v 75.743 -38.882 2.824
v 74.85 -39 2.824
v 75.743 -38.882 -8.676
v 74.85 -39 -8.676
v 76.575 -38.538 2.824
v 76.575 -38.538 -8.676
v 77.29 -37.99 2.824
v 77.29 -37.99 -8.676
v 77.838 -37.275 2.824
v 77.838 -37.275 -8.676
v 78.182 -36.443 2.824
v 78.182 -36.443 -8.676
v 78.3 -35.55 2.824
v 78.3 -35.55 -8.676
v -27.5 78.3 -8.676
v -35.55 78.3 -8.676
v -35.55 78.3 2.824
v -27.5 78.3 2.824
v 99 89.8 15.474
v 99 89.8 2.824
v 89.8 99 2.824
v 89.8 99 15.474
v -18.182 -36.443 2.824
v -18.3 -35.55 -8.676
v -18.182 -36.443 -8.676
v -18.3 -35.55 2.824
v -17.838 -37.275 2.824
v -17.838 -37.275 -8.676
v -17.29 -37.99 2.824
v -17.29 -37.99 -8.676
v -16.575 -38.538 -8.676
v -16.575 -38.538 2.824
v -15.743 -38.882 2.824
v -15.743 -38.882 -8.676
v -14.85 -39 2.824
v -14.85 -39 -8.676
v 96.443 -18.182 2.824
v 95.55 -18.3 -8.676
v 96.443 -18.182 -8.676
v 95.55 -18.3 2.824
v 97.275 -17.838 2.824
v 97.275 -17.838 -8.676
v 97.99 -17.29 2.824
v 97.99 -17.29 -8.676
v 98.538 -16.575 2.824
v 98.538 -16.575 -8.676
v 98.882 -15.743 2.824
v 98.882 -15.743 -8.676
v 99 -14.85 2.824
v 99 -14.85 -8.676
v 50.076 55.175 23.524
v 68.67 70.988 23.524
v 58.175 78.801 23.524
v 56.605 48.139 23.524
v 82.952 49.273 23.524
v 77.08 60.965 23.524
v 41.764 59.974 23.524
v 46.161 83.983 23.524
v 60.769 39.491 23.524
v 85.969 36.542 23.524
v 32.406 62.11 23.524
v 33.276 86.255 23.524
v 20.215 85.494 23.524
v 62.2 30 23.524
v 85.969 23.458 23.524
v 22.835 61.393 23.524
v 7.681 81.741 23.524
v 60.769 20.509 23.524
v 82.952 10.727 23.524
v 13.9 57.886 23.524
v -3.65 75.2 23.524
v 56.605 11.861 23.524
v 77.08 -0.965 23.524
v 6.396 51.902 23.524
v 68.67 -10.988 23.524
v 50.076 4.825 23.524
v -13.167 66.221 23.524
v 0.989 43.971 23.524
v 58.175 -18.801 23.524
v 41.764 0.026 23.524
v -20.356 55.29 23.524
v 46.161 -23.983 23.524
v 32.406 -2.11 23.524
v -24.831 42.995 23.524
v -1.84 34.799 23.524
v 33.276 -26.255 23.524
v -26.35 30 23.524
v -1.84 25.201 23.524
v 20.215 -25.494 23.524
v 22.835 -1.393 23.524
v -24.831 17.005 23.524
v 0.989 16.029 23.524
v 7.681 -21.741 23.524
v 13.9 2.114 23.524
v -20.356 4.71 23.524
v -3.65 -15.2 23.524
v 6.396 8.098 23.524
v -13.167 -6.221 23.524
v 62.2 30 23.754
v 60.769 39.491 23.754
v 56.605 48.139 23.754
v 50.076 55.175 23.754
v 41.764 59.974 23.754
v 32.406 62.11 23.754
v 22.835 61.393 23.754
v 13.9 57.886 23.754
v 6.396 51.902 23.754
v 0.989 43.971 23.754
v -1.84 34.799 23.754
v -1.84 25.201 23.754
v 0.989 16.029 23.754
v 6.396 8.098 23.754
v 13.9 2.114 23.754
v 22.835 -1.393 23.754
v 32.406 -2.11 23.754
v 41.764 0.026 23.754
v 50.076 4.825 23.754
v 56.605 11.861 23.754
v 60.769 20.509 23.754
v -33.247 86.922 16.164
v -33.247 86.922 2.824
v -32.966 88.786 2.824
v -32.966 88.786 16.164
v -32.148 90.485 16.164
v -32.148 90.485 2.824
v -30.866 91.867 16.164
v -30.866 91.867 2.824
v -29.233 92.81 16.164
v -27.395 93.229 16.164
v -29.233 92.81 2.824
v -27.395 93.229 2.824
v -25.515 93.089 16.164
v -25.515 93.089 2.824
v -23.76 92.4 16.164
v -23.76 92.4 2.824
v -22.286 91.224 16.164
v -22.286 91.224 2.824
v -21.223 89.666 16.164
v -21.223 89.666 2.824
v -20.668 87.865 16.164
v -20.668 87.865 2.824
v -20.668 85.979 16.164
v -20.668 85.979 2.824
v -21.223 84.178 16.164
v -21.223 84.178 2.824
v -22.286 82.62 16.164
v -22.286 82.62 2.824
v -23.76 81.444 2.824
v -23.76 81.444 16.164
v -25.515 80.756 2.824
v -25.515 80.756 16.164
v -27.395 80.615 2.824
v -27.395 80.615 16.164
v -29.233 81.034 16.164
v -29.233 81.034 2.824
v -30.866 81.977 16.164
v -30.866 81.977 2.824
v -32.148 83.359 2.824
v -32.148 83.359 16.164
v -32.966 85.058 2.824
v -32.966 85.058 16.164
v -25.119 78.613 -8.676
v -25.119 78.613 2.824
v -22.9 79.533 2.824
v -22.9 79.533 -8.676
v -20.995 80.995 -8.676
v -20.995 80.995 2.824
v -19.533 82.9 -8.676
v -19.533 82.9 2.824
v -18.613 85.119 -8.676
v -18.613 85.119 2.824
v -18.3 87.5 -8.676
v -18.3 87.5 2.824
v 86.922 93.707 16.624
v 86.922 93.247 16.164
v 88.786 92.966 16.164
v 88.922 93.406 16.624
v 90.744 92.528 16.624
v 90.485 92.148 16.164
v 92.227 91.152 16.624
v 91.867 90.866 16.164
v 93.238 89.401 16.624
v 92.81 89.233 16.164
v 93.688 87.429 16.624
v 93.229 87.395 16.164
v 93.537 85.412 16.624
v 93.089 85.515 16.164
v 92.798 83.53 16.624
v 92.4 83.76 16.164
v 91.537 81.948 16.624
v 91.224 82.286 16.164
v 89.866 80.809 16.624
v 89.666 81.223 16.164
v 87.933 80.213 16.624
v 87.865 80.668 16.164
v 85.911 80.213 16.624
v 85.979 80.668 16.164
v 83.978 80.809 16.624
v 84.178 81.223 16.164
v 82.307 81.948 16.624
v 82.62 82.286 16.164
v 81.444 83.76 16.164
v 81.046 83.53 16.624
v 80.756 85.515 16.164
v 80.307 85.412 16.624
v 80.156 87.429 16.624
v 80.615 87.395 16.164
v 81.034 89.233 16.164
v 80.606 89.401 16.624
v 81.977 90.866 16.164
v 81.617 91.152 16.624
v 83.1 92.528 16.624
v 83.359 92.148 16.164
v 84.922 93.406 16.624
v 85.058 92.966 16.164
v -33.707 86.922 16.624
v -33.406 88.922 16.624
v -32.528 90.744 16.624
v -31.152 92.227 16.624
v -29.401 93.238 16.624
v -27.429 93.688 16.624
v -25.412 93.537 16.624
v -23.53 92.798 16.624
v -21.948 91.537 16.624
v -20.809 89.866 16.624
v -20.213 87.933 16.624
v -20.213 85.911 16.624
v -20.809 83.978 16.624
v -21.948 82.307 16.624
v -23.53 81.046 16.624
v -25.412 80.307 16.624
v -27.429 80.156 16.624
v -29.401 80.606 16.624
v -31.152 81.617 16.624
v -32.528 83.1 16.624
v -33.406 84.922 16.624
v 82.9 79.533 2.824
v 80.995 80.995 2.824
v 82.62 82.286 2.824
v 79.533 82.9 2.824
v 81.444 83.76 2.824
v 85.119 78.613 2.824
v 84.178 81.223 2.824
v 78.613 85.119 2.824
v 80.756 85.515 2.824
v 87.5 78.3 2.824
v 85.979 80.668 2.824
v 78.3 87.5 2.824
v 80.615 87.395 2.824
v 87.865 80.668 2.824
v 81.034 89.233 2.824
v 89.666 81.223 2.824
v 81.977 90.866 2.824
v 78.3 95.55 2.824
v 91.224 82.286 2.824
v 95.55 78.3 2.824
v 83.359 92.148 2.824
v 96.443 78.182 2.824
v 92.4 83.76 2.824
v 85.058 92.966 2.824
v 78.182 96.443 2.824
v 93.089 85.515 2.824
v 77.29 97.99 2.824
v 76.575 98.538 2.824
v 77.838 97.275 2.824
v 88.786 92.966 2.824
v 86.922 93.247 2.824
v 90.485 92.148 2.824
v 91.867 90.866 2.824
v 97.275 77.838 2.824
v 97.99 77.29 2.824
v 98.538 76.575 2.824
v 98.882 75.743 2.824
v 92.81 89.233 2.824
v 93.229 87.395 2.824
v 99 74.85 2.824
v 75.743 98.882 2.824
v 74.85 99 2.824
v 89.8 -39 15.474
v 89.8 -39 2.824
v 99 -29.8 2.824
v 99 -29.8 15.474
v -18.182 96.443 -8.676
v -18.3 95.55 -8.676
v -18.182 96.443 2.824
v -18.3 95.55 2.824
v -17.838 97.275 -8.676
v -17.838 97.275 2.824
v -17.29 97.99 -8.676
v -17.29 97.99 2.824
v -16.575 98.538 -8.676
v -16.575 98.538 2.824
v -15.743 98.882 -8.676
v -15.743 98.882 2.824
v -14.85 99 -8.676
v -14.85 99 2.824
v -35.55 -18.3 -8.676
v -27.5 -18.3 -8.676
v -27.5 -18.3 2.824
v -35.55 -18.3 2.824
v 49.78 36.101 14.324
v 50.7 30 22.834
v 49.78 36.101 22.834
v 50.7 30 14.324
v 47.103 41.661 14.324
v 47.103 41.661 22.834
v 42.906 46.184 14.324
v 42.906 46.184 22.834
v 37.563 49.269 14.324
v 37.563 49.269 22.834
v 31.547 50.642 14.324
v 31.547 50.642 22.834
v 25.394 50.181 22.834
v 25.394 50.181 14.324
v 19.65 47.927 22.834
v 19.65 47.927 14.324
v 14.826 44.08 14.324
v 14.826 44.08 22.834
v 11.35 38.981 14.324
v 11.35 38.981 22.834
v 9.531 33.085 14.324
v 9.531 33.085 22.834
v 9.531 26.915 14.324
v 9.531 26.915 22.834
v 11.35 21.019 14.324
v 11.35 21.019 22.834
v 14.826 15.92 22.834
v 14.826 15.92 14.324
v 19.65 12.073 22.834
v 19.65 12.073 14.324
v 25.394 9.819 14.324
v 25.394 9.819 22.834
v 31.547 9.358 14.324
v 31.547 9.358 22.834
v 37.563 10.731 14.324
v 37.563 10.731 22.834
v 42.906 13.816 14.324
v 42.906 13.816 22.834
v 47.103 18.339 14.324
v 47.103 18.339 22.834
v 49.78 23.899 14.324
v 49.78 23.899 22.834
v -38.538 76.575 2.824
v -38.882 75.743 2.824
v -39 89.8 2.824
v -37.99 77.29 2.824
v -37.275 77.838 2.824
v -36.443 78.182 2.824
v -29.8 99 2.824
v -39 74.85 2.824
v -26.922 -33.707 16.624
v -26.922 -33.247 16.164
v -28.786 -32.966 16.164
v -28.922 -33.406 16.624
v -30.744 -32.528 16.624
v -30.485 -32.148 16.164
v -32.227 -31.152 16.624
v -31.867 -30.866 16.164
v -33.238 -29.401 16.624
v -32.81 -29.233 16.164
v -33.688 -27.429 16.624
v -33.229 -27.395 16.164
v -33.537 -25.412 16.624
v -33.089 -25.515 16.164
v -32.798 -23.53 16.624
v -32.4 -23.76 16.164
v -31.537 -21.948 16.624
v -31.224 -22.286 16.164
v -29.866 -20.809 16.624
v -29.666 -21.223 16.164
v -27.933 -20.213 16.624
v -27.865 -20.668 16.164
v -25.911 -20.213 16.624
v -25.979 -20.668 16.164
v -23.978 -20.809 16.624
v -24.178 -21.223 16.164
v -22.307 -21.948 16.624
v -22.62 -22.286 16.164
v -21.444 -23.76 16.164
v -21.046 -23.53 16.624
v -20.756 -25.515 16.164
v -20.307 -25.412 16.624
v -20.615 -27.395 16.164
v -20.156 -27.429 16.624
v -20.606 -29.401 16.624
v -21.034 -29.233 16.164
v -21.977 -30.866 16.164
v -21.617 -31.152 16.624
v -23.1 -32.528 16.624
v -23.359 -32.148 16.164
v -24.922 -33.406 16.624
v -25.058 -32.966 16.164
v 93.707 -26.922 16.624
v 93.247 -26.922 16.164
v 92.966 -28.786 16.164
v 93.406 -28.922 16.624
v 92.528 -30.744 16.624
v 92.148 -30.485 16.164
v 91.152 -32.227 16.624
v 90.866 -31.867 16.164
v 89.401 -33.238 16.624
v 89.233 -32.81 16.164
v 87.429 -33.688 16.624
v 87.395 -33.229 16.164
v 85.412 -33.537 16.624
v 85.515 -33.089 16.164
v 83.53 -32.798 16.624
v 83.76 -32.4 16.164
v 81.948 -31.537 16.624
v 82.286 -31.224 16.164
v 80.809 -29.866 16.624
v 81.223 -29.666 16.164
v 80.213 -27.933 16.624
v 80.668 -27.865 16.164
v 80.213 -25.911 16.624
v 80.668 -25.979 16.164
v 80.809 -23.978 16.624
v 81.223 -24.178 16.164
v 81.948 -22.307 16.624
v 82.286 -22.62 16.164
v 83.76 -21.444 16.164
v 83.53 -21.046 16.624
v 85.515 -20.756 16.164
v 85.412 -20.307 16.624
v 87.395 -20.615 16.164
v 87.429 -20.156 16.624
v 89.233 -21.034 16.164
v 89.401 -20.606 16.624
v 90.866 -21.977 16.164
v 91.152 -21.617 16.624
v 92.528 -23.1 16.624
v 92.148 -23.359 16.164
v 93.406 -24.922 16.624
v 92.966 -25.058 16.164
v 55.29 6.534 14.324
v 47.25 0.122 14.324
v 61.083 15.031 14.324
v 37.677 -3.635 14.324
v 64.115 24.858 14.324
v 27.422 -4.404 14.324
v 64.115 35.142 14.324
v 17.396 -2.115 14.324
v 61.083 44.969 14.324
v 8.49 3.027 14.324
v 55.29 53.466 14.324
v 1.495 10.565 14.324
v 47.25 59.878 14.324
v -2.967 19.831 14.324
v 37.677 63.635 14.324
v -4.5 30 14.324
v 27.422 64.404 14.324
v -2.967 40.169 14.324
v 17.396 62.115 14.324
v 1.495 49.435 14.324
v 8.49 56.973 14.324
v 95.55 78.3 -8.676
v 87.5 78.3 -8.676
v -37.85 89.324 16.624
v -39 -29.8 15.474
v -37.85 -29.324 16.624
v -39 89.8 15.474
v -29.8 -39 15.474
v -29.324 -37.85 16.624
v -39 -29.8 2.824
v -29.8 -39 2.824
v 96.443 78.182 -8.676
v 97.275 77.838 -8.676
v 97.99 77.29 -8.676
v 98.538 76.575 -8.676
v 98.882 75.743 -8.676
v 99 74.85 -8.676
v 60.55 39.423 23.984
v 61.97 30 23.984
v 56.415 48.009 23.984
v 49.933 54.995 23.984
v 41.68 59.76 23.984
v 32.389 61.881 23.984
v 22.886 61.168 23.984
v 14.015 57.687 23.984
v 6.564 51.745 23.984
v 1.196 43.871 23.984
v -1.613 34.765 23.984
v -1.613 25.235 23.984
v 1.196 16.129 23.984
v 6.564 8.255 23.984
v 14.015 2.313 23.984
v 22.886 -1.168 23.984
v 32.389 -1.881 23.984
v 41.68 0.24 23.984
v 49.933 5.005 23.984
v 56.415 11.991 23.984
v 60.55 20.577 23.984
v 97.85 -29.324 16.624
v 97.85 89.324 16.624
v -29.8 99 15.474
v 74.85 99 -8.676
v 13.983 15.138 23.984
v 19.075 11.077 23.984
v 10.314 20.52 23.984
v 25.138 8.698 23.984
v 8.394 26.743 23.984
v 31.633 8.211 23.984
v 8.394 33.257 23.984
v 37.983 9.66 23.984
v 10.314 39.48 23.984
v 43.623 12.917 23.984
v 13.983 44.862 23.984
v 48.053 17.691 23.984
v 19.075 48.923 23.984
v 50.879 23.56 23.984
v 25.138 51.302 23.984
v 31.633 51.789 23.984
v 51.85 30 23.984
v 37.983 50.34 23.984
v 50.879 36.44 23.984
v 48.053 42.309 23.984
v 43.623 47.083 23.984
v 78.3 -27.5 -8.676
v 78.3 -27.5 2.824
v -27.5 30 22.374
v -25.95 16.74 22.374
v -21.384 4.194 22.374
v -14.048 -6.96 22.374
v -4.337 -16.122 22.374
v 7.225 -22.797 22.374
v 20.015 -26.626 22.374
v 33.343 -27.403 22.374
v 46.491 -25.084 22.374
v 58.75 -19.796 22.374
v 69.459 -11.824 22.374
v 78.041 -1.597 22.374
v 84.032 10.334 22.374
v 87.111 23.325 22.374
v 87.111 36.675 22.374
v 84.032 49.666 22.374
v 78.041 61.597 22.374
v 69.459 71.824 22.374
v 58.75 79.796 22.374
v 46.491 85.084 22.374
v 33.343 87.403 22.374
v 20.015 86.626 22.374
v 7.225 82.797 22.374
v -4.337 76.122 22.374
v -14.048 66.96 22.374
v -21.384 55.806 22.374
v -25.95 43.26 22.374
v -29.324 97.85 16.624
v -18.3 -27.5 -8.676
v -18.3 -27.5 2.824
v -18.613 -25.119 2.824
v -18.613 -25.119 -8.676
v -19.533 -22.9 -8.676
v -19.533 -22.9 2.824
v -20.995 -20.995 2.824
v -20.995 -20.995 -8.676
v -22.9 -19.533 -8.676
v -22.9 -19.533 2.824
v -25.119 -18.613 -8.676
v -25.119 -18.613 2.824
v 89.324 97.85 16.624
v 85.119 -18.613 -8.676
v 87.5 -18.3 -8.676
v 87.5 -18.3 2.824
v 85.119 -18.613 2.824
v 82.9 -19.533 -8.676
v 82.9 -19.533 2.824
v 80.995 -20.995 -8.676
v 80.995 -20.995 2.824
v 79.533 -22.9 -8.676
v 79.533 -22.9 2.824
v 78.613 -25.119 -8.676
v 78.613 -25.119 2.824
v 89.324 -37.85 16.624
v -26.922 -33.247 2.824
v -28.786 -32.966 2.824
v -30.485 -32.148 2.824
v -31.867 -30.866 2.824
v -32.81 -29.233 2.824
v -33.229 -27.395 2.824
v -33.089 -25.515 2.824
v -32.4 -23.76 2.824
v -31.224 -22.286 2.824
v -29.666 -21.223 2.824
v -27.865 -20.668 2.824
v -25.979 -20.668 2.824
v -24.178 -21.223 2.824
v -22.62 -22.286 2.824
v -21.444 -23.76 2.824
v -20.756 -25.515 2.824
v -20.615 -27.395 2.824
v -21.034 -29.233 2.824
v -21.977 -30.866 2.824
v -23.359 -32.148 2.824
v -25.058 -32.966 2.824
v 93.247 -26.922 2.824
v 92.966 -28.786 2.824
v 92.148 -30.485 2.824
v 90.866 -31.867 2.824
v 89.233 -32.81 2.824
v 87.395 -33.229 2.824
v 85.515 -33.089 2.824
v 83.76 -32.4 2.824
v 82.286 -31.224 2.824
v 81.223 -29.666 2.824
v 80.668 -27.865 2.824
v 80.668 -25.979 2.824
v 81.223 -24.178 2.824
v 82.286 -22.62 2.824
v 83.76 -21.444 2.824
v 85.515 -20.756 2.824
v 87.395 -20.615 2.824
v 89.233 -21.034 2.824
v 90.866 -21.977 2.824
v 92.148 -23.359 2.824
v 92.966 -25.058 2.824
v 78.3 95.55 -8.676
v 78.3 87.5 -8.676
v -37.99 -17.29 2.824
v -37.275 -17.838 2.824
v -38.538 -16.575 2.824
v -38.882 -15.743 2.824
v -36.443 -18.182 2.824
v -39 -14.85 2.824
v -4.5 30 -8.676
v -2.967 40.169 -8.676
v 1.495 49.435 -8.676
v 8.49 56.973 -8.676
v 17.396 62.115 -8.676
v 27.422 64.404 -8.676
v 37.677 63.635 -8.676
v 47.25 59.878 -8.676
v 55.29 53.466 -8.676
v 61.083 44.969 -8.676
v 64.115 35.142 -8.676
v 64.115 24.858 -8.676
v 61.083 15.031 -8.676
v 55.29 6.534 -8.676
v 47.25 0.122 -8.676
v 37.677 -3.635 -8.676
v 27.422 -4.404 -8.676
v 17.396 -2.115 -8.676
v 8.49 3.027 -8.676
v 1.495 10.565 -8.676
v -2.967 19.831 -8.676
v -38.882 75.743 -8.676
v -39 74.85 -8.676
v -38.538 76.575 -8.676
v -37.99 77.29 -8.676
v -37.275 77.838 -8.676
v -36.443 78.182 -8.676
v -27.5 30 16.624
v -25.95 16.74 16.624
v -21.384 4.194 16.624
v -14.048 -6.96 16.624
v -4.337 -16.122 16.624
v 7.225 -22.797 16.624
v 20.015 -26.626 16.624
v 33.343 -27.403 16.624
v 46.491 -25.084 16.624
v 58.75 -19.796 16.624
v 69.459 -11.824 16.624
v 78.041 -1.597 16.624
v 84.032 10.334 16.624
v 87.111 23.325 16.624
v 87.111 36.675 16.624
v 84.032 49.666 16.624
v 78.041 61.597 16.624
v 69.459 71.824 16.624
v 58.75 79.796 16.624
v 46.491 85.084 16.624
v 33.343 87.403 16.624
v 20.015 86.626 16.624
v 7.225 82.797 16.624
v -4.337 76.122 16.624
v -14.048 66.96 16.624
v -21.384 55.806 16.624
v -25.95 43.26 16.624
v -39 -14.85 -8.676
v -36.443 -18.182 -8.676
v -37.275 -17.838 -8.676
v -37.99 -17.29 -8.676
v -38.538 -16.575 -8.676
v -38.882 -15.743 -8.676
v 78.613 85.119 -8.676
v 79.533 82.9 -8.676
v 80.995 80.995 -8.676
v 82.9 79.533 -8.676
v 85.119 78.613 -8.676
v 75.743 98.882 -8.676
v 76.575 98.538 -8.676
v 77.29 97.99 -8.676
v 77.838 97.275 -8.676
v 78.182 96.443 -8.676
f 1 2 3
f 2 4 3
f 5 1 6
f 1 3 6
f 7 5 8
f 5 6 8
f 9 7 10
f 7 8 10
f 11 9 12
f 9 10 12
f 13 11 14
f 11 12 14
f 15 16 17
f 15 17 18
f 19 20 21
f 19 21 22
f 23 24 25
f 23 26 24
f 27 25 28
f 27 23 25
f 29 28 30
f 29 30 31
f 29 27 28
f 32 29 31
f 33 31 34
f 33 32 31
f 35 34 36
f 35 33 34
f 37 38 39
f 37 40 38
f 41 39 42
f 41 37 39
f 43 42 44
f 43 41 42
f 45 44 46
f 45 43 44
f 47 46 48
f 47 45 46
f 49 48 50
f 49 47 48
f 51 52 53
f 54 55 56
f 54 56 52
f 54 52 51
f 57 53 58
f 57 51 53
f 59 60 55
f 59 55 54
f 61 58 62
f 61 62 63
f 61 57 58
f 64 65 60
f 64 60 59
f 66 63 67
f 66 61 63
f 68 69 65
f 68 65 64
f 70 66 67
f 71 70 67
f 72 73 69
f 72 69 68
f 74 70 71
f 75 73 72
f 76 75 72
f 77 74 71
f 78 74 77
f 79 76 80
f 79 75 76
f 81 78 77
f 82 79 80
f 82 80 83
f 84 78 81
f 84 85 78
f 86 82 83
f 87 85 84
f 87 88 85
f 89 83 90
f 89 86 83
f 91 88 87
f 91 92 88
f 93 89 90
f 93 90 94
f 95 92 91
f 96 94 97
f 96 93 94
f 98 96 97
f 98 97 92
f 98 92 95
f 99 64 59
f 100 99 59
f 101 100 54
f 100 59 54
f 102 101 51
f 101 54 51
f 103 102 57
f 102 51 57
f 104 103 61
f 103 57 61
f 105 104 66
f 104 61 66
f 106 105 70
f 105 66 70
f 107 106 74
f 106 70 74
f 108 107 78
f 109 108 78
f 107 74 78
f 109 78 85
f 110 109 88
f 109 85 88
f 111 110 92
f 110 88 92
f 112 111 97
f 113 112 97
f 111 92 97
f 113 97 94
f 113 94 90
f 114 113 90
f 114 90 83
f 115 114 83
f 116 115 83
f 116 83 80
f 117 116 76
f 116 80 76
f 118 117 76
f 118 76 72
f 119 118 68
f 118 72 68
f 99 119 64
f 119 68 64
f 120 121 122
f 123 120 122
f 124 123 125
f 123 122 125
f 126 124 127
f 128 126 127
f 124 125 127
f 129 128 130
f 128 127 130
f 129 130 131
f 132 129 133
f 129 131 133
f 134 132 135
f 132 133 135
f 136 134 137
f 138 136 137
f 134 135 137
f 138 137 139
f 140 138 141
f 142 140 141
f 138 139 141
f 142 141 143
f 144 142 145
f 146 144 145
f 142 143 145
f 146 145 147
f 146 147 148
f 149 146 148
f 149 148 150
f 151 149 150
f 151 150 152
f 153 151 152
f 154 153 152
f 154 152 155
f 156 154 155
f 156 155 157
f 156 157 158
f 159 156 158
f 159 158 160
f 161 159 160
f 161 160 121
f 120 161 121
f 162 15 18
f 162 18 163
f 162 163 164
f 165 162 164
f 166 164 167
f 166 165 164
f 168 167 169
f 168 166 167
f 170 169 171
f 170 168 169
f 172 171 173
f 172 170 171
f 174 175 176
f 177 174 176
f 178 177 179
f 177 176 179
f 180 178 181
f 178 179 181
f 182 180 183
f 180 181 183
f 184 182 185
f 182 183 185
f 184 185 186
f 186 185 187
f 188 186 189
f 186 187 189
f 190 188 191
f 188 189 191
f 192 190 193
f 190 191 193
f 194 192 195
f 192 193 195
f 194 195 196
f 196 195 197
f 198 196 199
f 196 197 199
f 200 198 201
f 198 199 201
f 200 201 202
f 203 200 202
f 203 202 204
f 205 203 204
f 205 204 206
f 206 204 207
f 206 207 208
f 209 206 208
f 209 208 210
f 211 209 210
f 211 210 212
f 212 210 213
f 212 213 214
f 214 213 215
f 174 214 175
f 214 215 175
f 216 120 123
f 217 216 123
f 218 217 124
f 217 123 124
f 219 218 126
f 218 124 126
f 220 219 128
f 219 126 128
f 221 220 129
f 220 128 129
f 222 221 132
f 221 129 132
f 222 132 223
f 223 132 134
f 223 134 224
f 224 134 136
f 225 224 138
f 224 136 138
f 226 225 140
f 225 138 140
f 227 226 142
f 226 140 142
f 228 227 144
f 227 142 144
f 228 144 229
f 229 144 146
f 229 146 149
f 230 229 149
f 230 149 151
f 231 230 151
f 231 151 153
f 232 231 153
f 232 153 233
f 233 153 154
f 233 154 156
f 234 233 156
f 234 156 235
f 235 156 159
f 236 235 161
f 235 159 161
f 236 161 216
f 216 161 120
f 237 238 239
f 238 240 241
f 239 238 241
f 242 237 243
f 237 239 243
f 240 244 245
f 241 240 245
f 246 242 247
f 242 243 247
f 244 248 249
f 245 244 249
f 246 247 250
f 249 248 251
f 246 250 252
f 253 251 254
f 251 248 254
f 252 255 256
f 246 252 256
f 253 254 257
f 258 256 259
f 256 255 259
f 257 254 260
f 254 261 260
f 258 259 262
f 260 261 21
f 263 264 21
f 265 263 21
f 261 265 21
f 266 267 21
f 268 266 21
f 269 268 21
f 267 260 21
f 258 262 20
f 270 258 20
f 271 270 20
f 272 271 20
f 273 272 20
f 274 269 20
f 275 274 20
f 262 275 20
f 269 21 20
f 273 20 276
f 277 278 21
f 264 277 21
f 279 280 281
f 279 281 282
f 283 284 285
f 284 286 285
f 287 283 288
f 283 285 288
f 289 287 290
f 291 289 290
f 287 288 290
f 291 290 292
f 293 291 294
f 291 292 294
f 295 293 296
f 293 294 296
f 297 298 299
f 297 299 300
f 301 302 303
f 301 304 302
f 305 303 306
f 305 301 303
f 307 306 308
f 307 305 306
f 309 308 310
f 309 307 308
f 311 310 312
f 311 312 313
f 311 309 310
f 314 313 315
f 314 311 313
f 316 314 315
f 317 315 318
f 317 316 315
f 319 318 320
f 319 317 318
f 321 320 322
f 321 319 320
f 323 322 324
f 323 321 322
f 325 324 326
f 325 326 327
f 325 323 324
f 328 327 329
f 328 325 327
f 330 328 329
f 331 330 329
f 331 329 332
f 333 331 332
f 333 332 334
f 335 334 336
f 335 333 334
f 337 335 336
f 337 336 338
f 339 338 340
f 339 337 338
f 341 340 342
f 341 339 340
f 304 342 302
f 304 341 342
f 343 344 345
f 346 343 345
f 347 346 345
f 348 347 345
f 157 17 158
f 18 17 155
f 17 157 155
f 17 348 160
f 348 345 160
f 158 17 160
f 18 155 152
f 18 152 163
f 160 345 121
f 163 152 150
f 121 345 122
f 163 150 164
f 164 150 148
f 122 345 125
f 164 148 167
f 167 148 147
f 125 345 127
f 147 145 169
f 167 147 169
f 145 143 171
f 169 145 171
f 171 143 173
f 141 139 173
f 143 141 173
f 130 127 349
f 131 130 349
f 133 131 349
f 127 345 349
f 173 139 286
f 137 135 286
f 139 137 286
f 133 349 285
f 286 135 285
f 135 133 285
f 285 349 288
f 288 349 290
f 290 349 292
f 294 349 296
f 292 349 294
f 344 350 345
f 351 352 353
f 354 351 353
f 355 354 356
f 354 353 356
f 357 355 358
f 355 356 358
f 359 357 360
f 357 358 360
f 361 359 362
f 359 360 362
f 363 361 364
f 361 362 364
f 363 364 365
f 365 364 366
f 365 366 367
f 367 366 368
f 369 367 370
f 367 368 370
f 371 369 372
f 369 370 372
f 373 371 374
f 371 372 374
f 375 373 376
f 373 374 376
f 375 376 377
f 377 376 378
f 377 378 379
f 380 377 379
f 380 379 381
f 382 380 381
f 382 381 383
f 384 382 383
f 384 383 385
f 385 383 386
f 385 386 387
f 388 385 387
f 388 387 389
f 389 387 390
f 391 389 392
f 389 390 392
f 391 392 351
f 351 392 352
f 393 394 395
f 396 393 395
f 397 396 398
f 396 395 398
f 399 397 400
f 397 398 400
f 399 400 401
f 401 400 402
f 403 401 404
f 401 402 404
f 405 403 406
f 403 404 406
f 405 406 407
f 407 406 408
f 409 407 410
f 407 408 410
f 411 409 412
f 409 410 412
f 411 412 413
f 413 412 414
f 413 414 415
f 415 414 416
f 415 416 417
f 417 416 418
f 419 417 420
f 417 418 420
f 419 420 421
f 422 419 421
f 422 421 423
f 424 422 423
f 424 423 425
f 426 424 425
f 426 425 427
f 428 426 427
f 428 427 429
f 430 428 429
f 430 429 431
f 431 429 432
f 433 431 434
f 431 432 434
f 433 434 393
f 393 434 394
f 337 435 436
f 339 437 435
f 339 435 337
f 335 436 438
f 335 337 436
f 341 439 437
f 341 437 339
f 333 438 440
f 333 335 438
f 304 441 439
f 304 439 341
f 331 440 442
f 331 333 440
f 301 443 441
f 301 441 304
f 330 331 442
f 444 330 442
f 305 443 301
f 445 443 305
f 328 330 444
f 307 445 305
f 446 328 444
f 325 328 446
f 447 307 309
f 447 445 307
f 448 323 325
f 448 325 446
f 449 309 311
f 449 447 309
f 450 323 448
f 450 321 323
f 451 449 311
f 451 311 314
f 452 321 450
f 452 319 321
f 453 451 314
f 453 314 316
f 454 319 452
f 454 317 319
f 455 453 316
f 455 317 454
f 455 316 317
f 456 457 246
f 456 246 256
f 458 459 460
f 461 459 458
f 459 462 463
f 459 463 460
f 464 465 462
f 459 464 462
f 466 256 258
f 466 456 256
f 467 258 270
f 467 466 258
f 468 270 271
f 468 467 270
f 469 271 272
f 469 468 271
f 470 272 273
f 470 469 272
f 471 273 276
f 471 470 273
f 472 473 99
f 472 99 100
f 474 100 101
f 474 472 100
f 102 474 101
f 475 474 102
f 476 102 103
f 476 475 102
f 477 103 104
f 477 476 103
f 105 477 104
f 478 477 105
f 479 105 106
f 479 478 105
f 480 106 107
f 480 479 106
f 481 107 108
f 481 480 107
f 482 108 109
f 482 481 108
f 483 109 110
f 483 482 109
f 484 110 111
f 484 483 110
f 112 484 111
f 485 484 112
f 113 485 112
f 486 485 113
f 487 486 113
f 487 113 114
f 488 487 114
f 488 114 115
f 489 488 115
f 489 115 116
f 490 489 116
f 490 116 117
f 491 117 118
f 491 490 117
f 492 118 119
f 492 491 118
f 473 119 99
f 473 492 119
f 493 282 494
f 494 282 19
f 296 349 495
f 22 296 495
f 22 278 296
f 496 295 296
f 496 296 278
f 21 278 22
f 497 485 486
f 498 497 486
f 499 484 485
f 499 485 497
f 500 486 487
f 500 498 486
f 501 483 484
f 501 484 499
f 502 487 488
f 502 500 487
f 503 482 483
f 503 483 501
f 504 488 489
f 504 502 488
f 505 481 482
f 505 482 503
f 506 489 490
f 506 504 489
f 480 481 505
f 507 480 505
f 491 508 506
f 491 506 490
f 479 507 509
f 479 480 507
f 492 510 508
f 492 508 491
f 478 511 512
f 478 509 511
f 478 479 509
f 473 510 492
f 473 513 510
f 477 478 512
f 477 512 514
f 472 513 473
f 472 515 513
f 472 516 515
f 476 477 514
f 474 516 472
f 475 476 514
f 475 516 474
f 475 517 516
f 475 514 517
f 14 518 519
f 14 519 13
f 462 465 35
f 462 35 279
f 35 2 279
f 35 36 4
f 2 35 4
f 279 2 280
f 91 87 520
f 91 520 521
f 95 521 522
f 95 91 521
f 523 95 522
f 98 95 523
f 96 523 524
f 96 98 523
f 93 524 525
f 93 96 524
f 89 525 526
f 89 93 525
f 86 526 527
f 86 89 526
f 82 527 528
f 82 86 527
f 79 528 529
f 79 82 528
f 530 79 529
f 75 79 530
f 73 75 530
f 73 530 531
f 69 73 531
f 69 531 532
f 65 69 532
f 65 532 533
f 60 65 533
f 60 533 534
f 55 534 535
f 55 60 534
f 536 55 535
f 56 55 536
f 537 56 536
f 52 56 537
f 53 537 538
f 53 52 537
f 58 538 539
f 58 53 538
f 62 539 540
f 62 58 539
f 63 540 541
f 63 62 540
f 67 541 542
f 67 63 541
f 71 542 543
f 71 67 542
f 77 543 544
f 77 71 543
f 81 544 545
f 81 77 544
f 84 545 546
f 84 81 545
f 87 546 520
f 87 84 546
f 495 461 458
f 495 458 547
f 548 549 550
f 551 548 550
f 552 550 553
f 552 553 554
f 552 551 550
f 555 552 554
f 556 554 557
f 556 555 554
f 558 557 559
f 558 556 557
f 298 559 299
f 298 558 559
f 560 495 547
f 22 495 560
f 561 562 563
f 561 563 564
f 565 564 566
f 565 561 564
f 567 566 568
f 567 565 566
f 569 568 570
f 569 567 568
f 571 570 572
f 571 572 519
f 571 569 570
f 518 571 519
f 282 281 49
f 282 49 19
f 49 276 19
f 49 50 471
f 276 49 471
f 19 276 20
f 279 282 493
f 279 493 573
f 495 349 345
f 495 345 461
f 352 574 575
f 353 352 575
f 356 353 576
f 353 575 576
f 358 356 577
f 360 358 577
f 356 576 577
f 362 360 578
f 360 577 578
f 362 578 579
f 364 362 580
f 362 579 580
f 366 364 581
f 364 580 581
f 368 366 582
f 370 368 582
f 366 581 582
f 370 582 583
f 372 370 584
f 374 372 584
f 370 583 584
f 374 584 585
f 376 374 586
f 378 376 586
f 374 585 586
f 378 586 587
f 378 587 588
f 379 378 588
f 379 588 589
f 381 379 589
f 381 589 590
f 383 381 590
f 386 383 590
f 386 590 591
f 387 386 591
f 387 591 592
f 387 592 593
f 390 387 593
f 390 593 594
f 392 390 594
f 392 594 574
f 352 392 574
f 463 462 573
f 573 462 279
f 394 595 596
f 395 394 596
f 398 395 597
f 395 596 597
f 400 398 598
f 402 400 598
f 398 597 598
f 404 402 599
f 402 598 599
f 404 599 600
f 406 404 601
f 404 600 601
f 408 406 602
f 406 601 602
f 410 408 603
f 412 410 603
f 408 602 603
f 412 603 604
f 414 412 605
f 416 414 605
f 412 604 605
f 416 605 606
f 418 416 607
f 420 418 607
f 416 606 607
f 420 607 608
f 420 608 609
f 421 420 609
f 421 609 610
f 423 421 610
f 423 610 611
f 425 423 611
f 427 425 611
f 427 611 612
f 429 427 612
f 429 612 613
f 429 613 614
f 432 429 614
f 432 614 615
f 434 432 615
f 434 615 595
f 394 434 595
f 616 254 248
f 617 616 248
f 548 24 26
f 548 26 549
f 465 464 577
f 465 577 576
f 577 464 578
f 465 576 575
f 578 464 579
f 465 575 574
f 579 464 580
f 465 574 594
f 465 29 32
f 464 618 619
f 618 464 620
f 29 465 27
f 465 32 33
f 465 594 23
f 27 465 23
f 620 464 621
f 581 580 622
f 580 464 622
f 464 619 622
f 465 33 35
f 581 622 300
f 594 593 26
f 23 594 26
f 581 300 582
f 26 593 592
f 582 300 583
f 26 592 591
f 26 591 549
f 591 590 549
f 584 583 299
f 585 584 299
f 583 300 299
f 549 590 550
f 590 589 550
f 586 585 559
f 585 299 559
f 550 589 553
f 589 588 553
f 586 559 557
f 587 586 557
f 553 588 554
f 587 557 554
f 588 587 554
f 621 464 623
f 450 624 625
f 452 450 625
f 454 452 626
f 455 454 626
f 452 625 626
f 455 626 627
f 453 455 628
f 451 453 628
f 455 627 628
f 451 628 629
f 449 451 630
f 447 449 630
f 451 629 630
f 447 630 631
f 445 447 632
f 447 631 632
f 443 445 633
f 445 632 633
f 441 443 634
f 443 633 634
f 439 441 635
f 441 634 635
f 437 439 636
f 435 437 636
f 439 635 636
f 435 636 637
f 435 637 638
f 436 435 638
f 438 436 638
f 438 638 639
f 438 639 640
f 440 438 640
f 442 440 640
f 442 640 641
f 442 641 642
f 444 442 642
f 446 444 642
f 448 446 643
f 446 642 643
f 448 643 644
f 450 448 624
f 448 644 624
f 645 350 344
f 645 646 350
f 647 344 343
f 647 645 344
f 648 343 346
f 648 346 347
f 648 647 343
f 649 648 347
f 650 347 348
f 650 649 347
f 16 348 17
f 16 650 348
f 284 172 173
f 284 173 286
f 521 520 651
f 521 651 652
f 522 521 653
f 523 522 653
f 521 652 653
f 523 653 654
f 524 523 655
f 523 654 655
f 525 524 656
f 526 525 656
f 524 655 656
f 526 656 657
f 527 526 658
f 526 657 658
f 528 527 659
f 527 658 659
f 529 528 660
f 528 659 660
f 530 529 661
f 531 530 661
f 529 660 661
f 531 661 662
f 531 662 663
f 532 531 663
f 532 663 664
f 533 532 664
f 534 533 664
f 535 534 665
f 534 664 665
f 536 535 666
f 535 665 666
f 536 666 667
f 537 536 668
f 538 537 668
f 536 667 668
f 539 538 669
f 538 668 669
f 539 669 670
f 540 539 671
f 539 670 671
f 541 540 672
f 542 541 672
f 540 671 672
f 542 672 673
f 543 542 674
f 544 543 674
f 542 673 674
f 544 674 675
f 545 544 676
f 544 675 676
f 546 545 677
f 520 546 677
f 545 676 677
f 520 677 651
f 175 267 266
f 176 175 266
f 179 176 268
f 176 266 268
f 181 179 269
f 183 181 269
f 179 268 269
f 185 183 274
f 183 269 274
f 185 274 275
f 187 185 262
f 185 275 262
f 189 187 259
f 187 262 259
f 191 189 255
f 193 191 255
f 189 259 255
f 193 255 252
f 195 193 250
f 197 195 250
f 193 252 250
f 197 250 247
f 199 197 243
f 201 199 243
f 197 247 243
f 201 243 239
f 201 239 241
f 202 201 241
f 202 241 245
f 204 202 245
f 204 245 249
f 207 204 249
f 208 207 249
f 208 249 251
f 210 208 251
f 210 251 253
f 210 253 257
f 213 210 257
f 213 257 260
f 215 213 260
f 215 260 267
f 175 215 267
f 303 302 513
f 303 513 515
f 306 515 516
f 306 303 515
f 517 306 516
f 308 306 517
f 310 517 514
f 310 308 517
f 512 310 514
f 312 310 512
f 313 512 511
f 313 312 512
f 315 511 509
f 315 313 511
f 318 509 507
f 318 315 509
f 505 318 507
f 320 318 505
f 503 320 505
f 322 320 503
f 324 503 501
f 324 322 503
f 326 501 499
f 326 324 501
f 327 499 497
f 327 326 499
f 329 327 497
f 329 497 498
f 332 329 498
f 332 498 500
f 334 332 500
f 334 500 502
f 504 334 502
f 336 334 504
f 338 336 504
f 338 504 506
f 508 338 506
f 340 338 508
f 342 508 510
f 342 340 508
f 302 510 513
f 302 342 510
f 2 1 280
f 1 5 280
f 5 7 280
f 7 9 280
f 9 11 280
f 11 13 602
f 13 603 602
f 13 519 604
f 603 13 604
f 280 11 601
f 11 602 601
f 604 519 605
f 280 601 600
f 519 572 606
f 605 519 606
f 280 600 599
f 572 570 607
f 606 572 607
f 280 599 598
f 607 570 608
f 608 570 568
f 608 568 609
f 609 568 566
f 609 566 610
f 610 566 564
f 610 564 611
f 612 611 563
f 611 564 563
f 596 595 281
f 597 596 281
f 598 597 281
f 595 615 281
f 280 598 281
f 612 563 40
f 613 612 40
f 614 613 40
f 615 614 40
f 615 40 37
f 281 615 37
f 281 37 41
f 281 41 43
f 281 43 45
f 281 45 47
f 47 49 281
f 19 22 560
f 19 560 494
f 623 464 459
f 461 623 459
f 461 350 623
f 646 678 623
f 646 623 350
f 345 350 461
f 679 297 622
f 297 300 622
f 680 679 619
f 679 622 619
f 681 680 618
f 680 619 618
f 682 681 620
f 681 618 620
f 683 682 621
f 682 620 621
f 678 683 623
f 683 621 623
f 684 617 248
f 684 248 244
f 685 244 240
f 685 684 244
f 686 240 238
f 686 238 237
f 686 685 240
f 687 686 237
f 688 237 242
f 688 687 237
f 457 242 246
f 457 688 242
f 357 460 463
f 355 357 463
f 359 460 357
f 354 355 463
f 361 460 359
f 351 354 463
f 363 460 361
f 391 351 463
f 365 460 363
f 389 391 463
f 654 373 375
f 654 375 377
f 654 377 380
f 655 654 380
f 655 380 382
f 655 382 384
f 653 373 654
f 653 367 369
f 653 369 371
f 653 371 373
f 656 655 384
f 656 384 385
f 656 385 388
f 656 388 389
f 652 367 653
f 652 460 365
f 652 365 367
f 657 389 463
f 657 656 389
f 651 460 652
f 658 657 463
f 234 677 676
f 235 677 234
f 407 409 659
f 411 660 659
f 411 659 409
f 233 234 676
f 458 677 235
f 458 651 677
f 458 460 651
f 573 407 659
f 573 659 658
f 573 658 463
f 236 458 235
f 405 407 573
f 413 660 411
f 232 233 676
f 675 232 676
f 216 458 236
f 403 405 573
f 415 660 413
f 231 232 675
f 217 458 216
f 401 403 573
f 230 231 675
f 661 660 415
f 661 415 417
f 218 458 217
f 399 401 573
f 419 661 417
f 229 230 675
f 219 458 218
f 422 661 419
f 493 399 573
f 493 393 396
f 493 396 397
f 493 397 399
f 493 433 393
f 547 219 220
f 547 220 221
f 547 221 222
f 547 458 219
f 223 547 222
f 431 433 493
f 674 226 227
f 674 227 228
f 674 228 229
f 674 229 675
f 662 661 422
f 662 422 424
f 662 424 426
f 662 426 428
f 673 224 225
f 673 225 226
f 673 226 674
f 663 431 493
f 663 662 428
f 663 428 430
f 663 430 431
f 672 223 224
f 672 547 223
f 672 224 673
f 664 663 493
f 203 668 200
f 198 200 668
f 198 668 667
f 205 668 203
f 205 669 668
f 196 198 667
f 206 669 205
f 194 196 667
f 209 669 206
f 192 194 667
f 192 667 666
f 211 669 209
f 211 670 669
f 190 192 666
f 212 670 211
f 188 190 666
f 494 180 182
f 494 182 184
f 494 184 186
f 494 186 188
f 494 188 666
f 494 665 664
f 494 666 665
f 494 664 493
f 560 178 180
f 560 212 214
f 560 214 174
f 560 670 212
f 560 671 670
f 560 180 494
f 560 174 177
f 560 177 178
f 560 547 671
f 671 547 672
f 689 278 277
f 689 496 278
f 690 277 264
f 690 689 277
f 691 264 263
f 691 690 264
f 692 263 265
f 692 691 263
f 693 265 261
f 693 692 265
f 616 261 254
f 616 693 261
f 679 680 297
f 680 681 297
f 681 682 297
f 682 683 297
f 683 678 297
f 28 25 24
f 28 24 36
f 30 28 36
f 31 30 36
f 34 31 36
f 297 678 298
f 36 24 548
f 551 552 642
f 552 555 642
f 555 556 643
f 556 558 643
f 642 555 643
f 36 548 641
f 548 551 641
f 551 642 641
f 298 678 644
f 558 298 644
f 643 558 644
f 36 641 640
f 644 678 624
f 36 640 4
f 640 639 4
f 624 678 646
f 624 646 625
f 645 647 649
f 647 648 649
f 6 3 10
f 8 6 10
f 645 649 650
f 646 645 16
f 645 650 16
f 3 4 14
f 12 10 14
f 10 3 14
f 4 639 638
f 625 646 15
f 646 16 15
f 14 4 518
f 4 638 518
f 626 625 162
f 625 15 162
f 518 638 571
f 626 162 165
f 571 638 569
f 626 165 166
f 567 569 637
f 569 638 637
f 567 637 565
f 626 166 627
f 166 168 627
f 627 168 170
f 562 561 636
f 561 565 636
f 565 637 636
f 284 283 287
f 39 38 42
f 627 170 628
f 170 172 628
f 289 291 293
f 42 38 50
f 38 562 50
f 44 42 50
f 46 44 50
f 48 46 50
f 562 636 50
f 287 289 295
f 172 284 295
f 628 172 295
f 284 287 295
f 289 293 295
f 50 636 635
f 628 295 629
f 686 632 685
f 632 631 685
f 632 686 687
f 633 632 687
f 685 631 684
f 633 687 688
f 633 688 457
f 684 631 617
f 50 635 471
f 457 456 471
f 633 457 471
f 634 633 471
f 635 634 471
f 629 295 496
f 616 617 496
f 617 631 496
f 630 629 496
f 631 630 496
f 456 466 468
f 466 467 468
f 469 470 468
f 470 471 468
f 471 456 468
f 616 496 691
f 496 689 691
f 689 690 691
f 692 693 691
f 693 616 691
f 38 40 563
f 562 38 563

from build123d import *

# Parameters (mm, degrees)
SKETCH1_W                  = 60
SKETCH1_H                  = 60
SKETCH1_R                  = 9
BOSS_EXTRUDE1_DEPTH        = 11
SKETCH2_R                  = 25
SKETCH2_R_2                = 9
BOSS_EXTRUDE2_DEPTH        = 3
SKETCH3_R                  = 14
SKETCH3_R_2                = 9
BOSS_EXTRUDE3_DEPTH        = 0.2
CHAMFER1_SIZE              = 0.5
CHAMFER2_SIZE              = 0.5
F_5_5_5_5_DIAMETER_HOLE1_D = 5.5
CIRPATTERN1_COUNT          = 4
CHAMFER3_SIZE              = 4
CHAMFER4_SIZE              = 4
CHAMFER5_SIZE              = 4
CHAMFER6_SIZE              = 4
CUT_EXTRUDE1_DEPTH         = 5
FILLET3_R                  = 1.5
FILLET4_R                  = 1.5
FILLET5_R                  = 1.5
CHAMFER7_SIZE              = 0.5
CHAMFER8_SIZE              = 0.2
CHAMFER9_SIZE              = 0.1
CHAMFER10_SIZE             = 0.5
SKETCH7_R                  = 15
CUT_EXTRUDE2_DEPTH         = 10
SCALE1_SCALE               = 2.3


with BuildPart() as part:
    # Sketch1 → Boss-Extrude1 (new body)
    with BuildSketch(Plane.XY):
        with Locations((30, 30)):
            Rectangle(SKETCH1_W, SKETCH1_H)
        with Locations((30, 30)):
            Circle(SKETCH1_R, mode=Mode.SUBTRACT)
    extrude(amount=BOSS_EXTRUDE1_DEPTH)

    # Sketch2 → Boss-Extrude2 (add)
    with BuildSketch(Plane.XY.offset(11)):
        with Locations(Location((30, 30, 0), (0, 0, 180))):
            Circle(SKETCH2_R)
        with Locations((30, 30)):
            Circle(SKETCH2_R_2, mode=Mode.SUBTRACT)
    extrude(amount=BOSS_EXTRUDE2_DEPTH)

    # Sketch3 → Boss-Extrude3 (add)
    with BuildSketch(Plane.XY.offset(14)):
        with Locations((30, 30)):
            Circle(SKETCH3_R)
        with Locations((30, 30)):
            Circle(SKETCH3_R_2, mode=Mode.SUBTRACT)
    extrude(amount=BOSS_EXTRUDE3_DEPTH)

    # Chamfer1
    chamfer1_edges = [part.edges().sort_by_distance(p)[0] for p in [
        (55, 30, 14),
    ]]
    chamfer(chamfer1_edges, length=CHAMFER1_SIZE)

    # Chamfer2
    chamfer2_edges = [part.edges().sort_by_distance(p)[0] for p in [
        (21, 30, 14.2),
    ]]
    chamfer(chamfer2_edges, length=CHAMFER2_SIZE)

    # Ø5.5 (5.5) Diameter Hole1 (through all)
    with Locations(Plane.XY.offset(11)):
        with Locations((5.251262658, 54.748737342)):
            f_5_5_5_5_diameter_hole1 = Hole(F_5_5_5_5_DIAMETER_HOLE1_D / 2)

    # CirPattern1: Ø5.5 (5.5) Diameter Hole1 ×4 about axis
    cirpattern1_axis = Axis((30, 30, 0), (0, 0, 1))
    for i in range(1, CIRPATTERN1_COUNT):
        add(f_5_5_5_5_diameter_hole1.rotate(cirpattern1_axis, i * 360 / CIRPATTERN1_COUNT), mode=Mode.SUBTRACT)

    # Chamfer3
    chamfer3_edges = [part.edges().sort_by_distance(p)[0] for p in [
        (0, 60, 5.5),
    ]]
    chamfer(chamfer3_edges, length=CHAMFER3_SIZE)

    # Chamfer4
    chamfer4_edges = [part.edges().sort_by_distance(p)[0] for p in [
        (60, 60, 5.5),
    ]]
    chamfer(chamfer4_edges, length=CHAMFER4_SIZE)

    # Chamfer5
    chamfer5_edges = [part.edges().sort_by_distance(p)[0] for p in [
        (60, 0, 5.5),
    ]]
    chamfer(chamfer5_edges, length=CHAMFER5_SIZE)

    # Chamfer6
    chamfer6_edges = [part.edges().sort_by_distance(p)[0] for p in [
        (0, 0, 5.5),
    ]]
    chamfer(chamfer6_edges, length=CHAMFER6_SIZE)

    # Sketch6 → Cut-Extrude1 (cut)
    with BuildSketch(Plane(origin=(0, 0, 0), x_dir=(-1, 0, 0), z_dir=(0, 0, -1))):
        with BuildLine():
            Line((-9, 68.337846227), (7.306259914, 68.337846227))
            Line((7.306259914, 68.337846227), (7.306259914, 51))
            Line((7.306259914, 51), (-5, 51))
            ThreePointArc((-5, 51), (-7.828427125, 52.171572875), (-9, 55))
            Line((-9, 55), (-9, 68.337846227))
        make_face()
        with BuildLine():
            Line((8.337846227, 9), (8.337846227, -7.306259914))
            Line((8.337846227, -7.306259914), (-9, -7.306259914))
            Line((-9, -7.306259914), (-9, 5))
            ThreePointArc((-9, 5), (-7.828427125, 7.828427125), (-5, 9))
            Line((-5, 9), (8.337846227, 9))
        make_face()
        with BuildLine():
            Line((-51, -8.337846227), (-67.306259914, -8.337846227))
            Line((-67.306259914, -8.337846227), (-67.306259914, 9))
            Line((-67.306259914, 9), (-55, 9))
            ThreePointArc((-55, 9), (-52.171572875, 7.828427125), (-51, 5))
            Line((-51, 5), (-51, -8.337846227))
        make_face()
        with BuildLine():
            Line((-68.337846227, 51), (-68.337846227, 67.306259914))
            Line((-68.337846227, 67.306259914), (-51, 67.306259914))
            Line((-51, 67.306259914), (-51, 55))
            ThreePointArc((-51, 55), (-52.171572875, 52.171572875), (-55, 51))
            Line((-55, 51), (-68.337846227, 51))
        make_face()
    extrude(amount=-CUT_EXTRUDE1_DEPTH, mode=Mode.SUBTRACT)

    # Fillet3
    fillet3_edges = [part.edges().sort_by_distance(p)[0] for p in [
        (60, 51, 2.5),
    ]]
    fillet(fillet3_edges, radius=FILLET3_R)

    # Fillet4
    fillet4_edges = [part.edges().sort_by_distance(p)[0] for p in [
        (51, 60, 2.5),
    ]]
    fillet(fillet4_edges, radius=FILLET4_R)

    # Fillet5
    fillet5_edges = [part.edges().sort_by_distance(p)[0] for p in [
        (9, 0, 2.5),
        (0, 9, 2.5),
        (60, 9, 2.5),
        (51, 0, 2.5),
        (9, 60, 2.5),
        (0, 51, 2.5),
    ]]
    fillet(fillet5_edges, radius=FILLET5_R)

    # Chamfer7
    chamfer7_edges = [part.edges().sort_by_distance(p)[0] for p in [
        (0, 30, 11),
        (2, 58, 11),
        (30, 60, 11),
        (58, 58, 11),
        (60, 30, 11),
        (58, 2, 11),
        (30, 0, 11),
        (2, 2, 11),
    ]]
    chamfer(chamfer7_edges, length=CHAMFER7_SIZE)

    # Chamfer8
    chamfer8_edges = [part.edges().sort_by_distance(p)[0] for p in [
        (8.001262658, 54.748737342, 11),
        (5.251262658, 8.001262658, 11),
        (51.998737342, 5.251262658, 11),
        (54.748737342, 51.998737342, 11),
    ]]
    chamfer(chamfer8_edges, length=CHAMFER8_SIZE)

    # Chamfer9
    chamfer9_edges = [part.edges().sort_by_distance(p)[0] for p in [
        (16, 30, 14.2),
    ]]
    chamfer(chamfer9_edges, length=CHAMFER9_SIZE)

    # Chamfer10
    chamfer10_edges = [part.edges().sort_by_distance(p)[0] for p in [
        (21, 30, 0),
    ]]
    chamfer(chamfer10_edges, length=CHAMFER10_SIZE)

    # Sketch7 → Cut-Extrude2 (cut)
    with BuildSketch(Plane(origin=(0, 0, 0), x_dir=(-1, 0, 0), z_dir=(0, 0, -1))):
        with Locations((-30, 30)):
            Circle(SKETCH7_R)
    extrude(amount=-CUT_EXTRUDE2_DEPTH, mode=Mode.SUBTRACT)


with BuildPart() as part_1:
    # Scale1: scaled about (30, 30, 6.673990553)
    add(part.part.scale(SCALE1_SCALE).moved(Location((-39, -39, -8.676187719))))


solid = part_1.part
